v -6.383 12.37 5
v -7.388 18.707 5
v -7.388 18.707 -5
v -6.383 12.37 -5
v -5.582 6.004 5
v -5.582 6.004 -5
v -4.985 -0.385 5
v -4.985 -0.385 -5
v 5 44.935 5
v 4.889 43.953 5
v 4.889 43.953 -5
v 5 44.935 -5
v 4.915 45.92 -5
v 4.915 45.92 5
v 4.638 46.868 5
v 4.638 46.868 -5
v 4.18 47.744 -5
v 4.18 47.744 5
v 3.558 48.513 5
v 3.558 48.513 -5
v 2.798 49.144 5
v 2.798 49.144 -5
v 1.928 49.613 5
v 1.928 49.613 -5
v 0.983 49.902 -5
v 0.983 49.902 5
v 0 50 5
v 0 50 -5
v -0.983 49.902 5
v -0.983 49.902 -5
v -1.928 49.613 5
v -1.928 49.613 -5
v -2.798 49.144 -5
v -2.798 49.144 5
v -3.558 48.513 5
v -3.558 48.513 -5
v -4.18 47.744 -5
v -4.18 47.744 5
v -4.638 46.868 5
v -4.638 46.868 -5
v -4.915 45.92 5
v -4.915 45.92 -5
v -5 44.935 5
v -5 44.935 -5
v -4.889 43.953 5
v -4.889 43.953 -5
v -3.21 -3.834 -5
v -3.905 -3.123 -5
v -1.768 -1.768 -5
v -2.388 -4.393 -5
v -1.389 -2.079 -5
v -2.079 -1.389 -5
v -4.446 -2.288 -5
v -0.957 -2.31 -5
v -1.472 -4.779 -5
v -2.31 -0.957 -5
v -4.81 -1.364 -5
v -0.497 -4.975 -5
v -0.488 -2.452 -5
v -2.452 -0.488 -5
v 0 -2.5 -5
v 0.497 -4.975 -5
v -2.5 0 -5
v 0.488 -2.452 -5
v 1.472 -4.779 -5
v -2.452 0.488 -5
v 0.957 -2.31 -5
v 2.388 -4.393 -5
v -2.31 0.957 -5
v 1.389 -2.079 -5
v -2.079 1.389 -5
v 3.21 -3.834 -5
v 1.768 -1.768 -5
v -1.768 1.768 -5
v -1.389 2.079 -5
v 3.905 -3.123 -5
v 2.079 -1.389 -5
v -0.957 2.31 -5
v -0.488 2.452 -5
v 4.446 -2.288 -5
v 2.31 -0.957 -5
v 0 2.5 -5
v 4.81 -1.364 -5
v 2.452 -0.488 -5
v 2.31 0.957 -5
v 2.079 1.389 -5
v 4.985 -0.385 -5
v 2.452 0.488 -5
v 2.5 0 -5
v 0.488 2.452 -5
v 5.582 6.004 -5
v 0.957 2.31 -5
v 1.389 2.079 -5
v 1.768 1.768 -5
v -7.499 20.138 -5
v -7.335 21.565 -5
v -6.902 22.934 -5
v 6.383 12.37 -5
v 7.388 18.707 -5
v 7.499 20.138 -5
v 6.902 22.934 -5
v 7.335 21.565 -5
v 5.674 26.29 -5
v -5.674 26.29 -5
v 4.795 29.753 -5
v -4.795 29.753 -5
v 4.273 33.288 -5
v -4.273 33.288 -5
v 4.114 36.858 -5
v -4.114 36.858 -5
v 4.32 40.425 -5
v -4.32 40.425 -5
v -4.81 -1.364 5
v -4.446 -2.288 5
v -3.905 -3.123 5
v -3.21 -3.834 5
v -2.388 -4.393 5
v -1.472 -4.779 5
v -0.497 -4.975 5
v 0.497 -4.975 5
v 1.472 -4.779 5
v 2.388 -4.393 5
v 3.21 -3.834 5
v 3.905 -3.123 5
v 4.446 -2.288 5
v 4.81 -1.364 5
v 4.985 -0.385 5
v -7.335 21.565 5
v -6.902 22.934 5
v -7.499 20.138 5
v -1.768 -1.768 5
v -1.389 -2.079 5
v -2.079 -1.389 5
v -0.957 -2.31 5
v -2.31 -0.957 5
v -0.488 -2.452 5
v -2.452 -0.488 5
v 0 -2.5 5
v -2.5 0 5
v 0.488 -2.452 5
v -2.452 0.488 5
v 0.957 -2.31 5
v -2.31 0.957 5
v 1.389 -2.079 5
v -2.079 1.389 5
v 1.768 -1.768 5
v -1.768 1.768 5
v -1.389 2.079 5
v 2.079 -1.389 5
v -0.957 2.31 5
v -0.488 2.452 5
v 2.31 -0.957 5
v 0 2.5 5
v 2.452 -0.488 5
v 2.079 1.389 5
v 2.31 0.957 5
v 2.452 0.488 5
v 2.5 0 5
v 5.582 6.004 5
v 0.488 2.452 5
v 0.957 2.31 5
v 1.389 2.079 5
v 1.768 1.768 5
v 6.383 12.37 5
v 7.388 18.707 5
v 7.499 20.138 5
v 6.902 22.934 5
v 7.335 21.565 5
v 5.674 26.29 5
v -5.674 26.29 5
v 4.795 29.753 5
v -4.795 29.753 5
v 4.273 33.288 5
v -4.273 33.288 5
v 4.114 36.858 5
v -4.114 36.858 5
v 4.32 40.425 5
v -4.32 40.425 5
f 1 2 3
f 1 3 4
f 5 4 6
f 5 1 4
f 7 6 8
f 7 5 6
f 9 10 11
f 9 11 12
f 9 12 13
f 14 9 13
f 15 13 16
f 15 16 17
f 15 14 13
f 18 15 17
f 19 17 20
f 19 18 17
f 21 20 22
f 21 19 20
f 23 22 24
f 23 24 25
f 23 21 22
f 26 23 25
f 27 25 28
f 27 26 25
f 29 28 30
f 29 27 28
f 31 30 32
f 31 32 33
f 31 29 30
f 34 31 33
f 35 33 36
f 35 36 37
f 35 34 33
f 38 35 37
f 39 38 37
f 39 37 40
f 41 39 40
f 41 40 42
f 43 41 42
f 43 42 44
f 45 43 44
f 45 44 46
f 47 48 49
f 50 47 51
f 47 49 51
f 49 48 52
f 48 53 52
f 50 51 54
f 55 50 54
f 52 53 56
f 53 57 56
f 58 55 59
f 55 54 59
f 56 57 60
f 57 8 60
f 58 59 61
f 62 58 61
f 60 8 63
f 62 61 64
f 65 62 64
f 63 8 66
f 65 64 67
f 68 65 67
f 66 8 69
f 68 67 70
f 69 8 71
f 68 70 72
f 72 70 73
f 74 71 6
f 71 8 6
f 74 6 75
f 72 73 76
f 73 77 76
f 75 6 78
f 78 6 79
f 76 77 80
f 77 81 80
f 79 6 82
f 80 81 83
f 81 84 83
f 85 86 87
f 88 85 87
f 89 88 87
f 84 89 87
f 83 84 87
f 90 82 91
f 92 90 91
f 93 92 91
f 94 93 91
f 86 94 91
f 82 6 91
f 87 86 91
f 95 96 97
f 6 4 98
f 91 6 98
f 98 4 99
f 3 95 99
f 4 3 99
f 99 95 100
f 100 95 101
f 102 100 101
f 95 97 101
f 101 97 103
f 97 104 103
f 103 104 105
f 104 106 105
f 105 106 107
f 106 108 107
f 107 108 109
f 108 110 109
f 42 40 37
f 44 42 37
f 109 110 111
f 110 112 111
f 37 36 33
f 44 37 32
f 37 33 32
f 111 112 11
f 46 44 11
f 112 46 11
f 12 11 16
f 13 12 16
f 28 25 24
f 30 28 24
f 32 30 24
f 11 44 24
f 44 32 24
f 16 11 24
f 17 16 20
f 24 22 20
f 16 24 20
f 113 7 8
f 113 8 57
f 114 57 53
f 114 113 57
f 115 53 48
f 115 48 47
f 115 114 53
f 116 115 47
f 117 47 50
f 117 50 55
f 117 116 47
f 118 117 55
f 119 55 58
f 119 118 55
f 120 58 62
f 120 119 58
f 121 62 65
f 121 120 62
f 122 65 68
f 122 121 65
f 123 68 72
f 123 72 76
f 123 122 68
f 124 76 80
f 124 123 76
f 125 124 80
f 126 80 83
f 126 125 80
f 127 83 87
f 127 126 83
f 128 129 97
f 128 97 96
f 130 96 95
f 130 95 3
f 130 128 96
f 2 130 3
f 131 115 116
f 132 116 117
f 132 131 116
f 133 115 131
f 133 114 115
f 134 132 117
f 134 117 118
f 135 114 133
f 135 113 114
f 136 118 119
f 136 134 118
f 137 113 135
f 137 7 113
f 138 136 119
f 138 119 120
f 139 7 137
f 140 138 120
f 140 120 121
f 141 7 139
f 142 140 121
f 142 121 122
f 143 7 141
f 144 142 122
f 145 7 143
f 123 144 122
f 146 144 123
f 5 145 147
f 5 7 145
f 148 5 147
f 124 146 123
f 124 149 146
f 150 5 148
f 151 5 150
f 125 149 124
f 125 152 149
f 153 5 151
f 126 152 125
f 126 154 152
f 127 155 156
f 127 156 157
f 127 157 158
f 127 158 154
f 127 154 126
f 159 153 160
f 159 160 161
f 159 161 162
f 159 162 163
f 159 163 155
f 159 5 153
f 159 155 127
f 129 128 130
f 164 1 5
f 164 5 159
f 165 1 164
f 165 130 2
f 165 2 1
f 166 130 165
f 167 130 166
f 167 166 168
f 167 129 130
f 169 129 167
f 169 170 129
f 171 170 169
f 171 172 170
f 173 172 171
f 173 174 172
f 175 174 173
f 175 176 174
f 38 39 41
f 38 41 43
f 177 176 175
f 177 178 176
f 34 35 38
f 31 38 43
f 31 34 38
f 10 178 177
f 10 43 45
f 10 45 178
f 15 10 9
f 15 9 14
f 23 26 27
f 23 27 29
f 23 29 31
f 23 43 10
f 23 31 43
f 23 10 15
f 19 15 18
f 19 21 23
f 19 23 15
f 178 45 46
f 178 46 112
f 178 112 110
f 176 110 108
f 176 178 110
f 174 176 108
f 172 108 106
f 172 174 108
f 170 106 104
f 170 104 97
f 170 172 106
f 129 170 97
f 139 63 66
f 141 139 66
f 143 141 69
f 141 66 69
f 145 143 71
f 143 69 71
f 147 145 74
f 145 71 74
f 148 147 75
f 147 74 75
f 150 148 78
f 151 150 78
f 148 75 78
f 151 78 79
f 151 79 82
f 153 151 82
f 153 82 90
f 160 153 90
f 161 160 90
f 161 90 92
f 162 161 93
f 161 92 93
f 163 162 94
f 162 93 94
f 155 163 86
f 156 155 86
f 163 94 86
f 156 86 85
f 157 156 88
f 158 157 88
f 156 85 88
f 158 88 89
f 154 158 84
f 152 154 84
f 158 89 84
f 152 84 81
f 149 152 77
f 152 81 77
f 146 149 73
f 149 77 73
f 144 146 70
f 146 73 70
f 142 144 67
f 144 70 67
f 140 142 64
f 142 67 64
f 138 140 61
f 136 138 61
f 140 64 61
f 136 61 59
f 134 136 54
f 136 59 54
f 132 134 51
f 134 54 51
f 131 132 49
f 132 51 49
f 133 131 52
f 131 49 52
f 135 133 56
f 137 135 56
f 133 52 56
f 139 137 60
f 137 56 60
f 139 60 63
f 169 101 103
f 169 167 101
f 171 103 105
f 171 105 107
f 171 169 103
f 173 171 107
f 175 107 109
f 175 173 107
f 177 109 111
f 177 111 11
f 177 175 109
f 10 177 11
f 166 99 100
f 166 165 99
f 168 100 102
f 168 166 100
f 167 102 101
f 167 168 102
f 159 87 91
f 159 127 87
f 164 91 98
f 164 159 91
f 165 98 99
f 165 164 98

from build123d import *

# Parameters (mm, degrees)
SKETCH1_R           = 5
SKETCH1_R_2         = 7.5
BOSS_EXTRUDE1_DEPTH = 5
SKETCH2_R           = 2.5
CUT_EXTRUDE1_DEPTH  = 10


with BuildPart() as part:
    # Sketch1 → Boss-Extrude1 (new, symmetric)
    with BuildSketch(Plane.XY):
        with BuildLine():
            ThreePointArc((-4.889177102, 43.953125), (-4.272856259, 33.288034301), (-6.902367673, 22.933823529))
            ThreePointArc((-6.902367673, 22.933823529), (0, 27.5), (6.902367673, 22.933823529))
            ThreePointArc((6.902367673, 22.933823529), (4.272856259, 33.288034301), (4.889177102, 43.953125))
            ThreePointArc((4.889177102, 43.953125), (0, 40), (-4.889177102, 43.953125))
        make_face()
        with Locations((0, 45)):
            Circle(SKETCH1_R)
        with Locations((0, 20)):
            Circle(SKETCH1_R_2)
        with BuildLine():
            ThreePointArc((-4.985162527, -0.384908537), (-0.192597204, 4.996289255), (5, 0))
            ThreePointArc((5, 0), (4.996289255, -0.192597204), (4.985162527, -0.384908537))
            ThreePointArc((4.985162527, -0.384908537), (5.956670882, 9.189806563), (7.387650492, 18.706701807))
            ThreePointArc((7.387650492, 18.706701807), (0, 12.5), (-7.387650492, 18.706701807))
            ThreePointArc((-7.387650492, 18.706701807), (-5.956670882, 9.189806563), (-4.985162527, -0.384908537))
        make_face()
        Circle(SKETCH1_R)
    extrude(amount=BOSS_EXTRUDE1_DEPTH, both=True)

    # Sketch2 → Cut-Extrude1 (cut)
    with BuildSketch(Plane(origin=(0, 0, -5), x_dir=(-1, 0, 0), z_dir=(0, 0, -1))):
        Circle(SKETCH2_R)
    extrude(amount=-CUT_EXTRUDE1_DEPTH, mode=Mode.SUBTRACT)


solid = part.part
